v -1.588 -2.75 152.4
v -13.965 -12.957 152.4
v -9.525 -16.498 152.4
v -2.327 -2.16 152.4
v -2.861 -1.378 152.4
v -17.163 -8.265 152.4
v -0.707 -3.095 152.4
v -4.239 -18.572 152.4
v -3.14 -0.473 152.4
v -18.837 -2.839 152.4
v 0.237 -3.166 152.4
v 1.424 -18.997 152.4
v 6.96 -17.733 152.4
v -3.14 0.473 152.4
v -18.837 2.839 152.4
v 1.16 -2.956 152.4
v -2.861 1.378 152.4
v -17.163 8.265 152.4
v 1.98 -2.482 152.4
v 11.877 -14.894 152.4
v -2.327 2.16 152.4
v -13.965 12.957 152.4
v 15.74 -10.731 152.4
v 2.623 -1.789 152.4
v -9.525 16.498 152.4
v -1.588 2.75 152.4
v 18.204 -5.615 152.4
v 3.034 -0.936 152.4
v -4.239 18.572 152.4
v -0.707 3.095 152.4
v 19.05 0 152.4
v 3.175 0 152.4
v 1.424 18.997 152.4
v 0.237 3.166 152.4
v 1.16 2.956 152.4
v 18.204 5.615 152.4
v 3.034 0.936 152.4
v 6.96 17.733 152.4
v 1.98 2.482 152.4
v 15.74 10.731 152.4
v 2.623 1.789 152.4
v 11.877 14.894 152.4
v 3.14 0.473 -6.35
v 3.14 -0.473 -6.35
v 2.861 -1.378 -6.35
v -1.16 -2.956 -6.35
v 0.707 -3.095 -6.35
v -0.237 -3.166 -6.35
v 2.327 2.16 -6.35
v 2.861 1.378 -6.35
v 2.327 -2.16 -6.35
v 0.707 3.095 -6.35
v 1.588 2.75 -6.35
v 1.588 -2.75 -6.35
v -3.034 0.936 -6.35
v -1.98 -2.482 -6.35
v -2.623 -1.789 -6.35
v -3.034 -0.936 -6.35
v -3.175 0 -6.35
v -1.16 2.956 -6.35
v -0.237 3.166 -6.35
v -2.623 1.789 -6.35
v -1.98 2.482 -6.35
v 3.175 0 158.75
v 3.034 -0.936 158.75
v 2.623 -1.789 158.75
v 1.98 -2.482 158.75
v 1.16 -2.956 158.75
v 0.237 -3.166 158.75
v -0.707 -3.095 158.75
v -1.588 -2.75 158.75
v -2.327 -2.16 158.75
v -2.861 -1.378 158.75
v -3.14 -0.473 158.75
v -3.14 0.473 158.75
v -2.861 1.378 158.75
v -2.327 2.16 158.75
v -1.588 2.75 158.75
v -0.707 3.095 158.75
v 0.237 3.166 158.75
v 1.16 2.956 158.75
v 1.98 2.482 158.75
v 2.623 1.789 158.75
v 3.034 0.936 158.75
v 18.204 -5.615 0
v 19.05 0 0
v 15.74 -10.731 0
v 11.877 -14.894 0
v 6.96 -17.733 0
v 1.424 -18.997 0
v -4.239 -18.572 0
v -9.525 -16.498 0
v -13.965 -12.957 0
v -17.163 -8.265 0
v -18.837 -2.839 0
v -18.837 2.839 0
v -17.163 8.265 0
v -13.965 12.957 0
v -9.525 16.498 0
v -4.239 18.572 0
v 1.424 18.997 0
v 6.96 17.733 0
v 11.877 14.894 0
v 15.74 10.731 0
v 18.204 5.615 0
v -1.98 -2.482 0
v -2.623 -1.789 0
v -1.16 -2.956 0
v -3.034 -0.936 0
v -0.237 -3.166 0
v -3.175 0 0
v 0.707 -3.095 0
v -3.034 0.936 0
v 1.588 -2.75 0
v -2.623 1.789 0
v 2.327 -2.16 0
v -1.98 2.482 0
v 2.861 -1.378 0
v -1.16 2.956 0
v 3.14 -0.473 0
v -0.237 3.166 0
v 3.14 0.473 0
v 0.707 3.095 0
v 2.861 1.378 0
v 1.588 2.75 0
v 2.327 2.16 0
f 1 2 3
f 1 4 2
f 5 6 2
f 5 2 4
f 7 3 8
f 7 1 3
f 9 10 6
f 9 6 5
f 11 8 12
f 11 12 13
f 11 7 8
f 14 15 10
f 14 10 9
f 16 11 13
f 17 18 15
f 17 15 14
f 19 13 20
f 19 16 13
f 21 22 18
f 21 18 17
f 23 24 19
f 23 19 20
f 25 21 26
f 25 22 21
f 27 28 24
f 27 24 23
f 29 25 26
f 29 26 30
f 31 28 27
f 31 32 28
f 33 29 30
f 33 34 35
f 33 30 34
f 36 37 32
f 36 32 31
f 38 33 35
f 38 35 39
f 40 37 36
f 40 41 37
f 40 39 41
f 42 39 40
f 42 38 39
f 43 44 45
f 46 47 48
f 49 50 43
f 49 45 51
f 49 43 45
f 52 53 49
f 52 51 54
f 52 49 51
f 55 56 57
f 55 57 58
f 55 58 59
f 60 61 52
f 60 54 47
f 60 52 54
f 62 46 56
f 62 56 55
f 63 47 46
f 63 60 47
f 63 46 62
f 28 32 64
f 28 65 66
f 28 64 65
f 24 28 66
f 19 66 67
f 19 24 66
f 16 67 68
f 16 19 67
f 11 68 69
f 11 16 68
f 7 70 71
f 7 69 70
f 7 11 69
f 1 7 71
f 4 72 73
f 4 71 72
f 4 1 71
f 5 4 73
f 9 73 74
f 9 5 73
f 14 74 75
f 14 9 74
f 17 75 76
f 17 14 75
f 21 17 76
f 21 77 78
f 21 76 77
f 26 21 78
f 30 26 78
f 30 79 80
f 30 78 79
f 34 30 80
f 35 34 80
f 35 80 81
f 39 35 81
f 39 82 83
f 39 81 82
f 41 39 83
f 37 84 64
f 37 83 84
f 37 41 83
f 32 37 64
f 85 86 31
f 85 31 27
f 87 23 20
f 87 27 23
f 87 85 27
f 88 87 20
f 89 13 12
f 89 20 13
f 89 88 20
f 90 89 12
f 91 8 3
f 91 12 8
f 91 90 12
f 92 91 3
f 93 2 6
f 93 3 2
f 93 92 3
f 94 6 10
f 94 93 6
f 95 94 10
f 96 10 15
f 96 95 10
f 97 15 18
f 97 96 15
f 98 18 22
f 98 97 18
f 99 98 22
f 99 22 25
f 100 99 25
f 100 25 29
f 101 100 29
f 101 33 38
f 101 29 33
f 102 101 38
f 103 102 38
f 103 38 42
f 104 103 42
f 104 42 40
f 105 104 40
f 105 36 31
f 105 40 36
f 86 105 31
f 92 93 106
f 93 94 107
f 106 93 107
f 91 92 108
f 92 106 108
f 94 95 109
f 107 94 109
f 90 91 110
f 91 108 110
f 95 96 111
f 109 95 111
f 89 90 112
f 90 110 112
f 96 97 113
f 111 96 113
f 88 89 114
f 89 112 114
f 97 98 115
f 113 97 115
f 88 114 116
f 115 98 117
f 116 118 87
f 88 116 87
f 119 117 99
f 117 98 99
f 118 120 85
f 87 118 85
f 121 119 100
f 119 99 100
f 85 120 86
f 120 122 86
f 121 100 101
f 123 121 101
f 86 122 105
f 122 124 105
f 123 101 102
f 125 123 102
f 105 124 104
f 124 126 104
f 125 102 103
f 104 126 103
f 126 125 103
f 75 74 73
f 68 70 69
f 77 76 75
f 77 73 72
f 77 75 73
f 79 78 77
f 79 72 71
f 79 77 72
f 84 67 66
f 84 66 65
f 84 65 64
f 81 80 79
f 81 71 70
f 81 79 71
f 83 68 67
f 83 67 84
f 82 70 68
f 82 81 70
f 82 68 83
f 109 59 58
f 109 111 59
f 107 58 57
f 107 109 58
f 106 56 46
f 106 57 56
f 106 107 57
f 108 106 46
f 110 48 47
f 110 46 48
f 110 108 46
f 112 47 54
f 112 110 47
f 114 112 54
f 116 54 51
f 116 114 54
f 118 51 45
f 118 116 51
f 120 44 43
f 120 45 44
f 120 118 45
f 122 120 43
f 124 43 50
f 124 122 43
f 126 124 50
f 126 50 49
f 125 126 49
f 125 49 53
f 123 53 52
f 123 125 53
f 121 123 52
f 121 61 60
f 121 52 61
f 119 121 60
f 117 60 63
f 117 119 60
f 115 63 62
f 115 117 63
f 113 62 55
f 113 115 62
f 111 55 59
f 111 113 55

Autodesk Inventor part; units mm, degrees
ref_plane "YZ Plane" through (0, 0, 0) normal (1, 0, 0) x (0, 1, 0)
ref_plane "XZ Plane" through (0, 0, 0) normal (0, 1, 0) x (-1, 0, 0)
ref_plane "XY Plane" through (0, 0, 0) normal (0, 0, 1) x (1, 0, 0)
sketch "Sketch1" plane through (0, 0, 0) normal (0, 0, 1) x (1, 0, 0)
  circle A0 centre (0, 0) radius 19.05
  dimension "d0" = 38.1
extrude "Extrusion1" add sketch "Sketch1" along normal blind 152.4
sketch "Sketch2" plane through (0, 0, 152.4) normal (0, 0, 1) x (1, 0, 0)
  circle A0 centre (0, 0) radius 3.175
  dimension "d3" = 6.35
extrude "Extrusion2" add sketch "Sketch2" along normal blind 6.35
sketch "Sketch3" plane through (0, 0, 0) normal (0, 0, -1) x (-1, 0, 0)
  circle A0 centre (0, 0) radius 3.175 projected
  circle A1 centre (0, 0) radius 3.175
extrude "Extrusion3" add sketch "Sketch3" along normal blind 6.35
properties part number "Roller"
